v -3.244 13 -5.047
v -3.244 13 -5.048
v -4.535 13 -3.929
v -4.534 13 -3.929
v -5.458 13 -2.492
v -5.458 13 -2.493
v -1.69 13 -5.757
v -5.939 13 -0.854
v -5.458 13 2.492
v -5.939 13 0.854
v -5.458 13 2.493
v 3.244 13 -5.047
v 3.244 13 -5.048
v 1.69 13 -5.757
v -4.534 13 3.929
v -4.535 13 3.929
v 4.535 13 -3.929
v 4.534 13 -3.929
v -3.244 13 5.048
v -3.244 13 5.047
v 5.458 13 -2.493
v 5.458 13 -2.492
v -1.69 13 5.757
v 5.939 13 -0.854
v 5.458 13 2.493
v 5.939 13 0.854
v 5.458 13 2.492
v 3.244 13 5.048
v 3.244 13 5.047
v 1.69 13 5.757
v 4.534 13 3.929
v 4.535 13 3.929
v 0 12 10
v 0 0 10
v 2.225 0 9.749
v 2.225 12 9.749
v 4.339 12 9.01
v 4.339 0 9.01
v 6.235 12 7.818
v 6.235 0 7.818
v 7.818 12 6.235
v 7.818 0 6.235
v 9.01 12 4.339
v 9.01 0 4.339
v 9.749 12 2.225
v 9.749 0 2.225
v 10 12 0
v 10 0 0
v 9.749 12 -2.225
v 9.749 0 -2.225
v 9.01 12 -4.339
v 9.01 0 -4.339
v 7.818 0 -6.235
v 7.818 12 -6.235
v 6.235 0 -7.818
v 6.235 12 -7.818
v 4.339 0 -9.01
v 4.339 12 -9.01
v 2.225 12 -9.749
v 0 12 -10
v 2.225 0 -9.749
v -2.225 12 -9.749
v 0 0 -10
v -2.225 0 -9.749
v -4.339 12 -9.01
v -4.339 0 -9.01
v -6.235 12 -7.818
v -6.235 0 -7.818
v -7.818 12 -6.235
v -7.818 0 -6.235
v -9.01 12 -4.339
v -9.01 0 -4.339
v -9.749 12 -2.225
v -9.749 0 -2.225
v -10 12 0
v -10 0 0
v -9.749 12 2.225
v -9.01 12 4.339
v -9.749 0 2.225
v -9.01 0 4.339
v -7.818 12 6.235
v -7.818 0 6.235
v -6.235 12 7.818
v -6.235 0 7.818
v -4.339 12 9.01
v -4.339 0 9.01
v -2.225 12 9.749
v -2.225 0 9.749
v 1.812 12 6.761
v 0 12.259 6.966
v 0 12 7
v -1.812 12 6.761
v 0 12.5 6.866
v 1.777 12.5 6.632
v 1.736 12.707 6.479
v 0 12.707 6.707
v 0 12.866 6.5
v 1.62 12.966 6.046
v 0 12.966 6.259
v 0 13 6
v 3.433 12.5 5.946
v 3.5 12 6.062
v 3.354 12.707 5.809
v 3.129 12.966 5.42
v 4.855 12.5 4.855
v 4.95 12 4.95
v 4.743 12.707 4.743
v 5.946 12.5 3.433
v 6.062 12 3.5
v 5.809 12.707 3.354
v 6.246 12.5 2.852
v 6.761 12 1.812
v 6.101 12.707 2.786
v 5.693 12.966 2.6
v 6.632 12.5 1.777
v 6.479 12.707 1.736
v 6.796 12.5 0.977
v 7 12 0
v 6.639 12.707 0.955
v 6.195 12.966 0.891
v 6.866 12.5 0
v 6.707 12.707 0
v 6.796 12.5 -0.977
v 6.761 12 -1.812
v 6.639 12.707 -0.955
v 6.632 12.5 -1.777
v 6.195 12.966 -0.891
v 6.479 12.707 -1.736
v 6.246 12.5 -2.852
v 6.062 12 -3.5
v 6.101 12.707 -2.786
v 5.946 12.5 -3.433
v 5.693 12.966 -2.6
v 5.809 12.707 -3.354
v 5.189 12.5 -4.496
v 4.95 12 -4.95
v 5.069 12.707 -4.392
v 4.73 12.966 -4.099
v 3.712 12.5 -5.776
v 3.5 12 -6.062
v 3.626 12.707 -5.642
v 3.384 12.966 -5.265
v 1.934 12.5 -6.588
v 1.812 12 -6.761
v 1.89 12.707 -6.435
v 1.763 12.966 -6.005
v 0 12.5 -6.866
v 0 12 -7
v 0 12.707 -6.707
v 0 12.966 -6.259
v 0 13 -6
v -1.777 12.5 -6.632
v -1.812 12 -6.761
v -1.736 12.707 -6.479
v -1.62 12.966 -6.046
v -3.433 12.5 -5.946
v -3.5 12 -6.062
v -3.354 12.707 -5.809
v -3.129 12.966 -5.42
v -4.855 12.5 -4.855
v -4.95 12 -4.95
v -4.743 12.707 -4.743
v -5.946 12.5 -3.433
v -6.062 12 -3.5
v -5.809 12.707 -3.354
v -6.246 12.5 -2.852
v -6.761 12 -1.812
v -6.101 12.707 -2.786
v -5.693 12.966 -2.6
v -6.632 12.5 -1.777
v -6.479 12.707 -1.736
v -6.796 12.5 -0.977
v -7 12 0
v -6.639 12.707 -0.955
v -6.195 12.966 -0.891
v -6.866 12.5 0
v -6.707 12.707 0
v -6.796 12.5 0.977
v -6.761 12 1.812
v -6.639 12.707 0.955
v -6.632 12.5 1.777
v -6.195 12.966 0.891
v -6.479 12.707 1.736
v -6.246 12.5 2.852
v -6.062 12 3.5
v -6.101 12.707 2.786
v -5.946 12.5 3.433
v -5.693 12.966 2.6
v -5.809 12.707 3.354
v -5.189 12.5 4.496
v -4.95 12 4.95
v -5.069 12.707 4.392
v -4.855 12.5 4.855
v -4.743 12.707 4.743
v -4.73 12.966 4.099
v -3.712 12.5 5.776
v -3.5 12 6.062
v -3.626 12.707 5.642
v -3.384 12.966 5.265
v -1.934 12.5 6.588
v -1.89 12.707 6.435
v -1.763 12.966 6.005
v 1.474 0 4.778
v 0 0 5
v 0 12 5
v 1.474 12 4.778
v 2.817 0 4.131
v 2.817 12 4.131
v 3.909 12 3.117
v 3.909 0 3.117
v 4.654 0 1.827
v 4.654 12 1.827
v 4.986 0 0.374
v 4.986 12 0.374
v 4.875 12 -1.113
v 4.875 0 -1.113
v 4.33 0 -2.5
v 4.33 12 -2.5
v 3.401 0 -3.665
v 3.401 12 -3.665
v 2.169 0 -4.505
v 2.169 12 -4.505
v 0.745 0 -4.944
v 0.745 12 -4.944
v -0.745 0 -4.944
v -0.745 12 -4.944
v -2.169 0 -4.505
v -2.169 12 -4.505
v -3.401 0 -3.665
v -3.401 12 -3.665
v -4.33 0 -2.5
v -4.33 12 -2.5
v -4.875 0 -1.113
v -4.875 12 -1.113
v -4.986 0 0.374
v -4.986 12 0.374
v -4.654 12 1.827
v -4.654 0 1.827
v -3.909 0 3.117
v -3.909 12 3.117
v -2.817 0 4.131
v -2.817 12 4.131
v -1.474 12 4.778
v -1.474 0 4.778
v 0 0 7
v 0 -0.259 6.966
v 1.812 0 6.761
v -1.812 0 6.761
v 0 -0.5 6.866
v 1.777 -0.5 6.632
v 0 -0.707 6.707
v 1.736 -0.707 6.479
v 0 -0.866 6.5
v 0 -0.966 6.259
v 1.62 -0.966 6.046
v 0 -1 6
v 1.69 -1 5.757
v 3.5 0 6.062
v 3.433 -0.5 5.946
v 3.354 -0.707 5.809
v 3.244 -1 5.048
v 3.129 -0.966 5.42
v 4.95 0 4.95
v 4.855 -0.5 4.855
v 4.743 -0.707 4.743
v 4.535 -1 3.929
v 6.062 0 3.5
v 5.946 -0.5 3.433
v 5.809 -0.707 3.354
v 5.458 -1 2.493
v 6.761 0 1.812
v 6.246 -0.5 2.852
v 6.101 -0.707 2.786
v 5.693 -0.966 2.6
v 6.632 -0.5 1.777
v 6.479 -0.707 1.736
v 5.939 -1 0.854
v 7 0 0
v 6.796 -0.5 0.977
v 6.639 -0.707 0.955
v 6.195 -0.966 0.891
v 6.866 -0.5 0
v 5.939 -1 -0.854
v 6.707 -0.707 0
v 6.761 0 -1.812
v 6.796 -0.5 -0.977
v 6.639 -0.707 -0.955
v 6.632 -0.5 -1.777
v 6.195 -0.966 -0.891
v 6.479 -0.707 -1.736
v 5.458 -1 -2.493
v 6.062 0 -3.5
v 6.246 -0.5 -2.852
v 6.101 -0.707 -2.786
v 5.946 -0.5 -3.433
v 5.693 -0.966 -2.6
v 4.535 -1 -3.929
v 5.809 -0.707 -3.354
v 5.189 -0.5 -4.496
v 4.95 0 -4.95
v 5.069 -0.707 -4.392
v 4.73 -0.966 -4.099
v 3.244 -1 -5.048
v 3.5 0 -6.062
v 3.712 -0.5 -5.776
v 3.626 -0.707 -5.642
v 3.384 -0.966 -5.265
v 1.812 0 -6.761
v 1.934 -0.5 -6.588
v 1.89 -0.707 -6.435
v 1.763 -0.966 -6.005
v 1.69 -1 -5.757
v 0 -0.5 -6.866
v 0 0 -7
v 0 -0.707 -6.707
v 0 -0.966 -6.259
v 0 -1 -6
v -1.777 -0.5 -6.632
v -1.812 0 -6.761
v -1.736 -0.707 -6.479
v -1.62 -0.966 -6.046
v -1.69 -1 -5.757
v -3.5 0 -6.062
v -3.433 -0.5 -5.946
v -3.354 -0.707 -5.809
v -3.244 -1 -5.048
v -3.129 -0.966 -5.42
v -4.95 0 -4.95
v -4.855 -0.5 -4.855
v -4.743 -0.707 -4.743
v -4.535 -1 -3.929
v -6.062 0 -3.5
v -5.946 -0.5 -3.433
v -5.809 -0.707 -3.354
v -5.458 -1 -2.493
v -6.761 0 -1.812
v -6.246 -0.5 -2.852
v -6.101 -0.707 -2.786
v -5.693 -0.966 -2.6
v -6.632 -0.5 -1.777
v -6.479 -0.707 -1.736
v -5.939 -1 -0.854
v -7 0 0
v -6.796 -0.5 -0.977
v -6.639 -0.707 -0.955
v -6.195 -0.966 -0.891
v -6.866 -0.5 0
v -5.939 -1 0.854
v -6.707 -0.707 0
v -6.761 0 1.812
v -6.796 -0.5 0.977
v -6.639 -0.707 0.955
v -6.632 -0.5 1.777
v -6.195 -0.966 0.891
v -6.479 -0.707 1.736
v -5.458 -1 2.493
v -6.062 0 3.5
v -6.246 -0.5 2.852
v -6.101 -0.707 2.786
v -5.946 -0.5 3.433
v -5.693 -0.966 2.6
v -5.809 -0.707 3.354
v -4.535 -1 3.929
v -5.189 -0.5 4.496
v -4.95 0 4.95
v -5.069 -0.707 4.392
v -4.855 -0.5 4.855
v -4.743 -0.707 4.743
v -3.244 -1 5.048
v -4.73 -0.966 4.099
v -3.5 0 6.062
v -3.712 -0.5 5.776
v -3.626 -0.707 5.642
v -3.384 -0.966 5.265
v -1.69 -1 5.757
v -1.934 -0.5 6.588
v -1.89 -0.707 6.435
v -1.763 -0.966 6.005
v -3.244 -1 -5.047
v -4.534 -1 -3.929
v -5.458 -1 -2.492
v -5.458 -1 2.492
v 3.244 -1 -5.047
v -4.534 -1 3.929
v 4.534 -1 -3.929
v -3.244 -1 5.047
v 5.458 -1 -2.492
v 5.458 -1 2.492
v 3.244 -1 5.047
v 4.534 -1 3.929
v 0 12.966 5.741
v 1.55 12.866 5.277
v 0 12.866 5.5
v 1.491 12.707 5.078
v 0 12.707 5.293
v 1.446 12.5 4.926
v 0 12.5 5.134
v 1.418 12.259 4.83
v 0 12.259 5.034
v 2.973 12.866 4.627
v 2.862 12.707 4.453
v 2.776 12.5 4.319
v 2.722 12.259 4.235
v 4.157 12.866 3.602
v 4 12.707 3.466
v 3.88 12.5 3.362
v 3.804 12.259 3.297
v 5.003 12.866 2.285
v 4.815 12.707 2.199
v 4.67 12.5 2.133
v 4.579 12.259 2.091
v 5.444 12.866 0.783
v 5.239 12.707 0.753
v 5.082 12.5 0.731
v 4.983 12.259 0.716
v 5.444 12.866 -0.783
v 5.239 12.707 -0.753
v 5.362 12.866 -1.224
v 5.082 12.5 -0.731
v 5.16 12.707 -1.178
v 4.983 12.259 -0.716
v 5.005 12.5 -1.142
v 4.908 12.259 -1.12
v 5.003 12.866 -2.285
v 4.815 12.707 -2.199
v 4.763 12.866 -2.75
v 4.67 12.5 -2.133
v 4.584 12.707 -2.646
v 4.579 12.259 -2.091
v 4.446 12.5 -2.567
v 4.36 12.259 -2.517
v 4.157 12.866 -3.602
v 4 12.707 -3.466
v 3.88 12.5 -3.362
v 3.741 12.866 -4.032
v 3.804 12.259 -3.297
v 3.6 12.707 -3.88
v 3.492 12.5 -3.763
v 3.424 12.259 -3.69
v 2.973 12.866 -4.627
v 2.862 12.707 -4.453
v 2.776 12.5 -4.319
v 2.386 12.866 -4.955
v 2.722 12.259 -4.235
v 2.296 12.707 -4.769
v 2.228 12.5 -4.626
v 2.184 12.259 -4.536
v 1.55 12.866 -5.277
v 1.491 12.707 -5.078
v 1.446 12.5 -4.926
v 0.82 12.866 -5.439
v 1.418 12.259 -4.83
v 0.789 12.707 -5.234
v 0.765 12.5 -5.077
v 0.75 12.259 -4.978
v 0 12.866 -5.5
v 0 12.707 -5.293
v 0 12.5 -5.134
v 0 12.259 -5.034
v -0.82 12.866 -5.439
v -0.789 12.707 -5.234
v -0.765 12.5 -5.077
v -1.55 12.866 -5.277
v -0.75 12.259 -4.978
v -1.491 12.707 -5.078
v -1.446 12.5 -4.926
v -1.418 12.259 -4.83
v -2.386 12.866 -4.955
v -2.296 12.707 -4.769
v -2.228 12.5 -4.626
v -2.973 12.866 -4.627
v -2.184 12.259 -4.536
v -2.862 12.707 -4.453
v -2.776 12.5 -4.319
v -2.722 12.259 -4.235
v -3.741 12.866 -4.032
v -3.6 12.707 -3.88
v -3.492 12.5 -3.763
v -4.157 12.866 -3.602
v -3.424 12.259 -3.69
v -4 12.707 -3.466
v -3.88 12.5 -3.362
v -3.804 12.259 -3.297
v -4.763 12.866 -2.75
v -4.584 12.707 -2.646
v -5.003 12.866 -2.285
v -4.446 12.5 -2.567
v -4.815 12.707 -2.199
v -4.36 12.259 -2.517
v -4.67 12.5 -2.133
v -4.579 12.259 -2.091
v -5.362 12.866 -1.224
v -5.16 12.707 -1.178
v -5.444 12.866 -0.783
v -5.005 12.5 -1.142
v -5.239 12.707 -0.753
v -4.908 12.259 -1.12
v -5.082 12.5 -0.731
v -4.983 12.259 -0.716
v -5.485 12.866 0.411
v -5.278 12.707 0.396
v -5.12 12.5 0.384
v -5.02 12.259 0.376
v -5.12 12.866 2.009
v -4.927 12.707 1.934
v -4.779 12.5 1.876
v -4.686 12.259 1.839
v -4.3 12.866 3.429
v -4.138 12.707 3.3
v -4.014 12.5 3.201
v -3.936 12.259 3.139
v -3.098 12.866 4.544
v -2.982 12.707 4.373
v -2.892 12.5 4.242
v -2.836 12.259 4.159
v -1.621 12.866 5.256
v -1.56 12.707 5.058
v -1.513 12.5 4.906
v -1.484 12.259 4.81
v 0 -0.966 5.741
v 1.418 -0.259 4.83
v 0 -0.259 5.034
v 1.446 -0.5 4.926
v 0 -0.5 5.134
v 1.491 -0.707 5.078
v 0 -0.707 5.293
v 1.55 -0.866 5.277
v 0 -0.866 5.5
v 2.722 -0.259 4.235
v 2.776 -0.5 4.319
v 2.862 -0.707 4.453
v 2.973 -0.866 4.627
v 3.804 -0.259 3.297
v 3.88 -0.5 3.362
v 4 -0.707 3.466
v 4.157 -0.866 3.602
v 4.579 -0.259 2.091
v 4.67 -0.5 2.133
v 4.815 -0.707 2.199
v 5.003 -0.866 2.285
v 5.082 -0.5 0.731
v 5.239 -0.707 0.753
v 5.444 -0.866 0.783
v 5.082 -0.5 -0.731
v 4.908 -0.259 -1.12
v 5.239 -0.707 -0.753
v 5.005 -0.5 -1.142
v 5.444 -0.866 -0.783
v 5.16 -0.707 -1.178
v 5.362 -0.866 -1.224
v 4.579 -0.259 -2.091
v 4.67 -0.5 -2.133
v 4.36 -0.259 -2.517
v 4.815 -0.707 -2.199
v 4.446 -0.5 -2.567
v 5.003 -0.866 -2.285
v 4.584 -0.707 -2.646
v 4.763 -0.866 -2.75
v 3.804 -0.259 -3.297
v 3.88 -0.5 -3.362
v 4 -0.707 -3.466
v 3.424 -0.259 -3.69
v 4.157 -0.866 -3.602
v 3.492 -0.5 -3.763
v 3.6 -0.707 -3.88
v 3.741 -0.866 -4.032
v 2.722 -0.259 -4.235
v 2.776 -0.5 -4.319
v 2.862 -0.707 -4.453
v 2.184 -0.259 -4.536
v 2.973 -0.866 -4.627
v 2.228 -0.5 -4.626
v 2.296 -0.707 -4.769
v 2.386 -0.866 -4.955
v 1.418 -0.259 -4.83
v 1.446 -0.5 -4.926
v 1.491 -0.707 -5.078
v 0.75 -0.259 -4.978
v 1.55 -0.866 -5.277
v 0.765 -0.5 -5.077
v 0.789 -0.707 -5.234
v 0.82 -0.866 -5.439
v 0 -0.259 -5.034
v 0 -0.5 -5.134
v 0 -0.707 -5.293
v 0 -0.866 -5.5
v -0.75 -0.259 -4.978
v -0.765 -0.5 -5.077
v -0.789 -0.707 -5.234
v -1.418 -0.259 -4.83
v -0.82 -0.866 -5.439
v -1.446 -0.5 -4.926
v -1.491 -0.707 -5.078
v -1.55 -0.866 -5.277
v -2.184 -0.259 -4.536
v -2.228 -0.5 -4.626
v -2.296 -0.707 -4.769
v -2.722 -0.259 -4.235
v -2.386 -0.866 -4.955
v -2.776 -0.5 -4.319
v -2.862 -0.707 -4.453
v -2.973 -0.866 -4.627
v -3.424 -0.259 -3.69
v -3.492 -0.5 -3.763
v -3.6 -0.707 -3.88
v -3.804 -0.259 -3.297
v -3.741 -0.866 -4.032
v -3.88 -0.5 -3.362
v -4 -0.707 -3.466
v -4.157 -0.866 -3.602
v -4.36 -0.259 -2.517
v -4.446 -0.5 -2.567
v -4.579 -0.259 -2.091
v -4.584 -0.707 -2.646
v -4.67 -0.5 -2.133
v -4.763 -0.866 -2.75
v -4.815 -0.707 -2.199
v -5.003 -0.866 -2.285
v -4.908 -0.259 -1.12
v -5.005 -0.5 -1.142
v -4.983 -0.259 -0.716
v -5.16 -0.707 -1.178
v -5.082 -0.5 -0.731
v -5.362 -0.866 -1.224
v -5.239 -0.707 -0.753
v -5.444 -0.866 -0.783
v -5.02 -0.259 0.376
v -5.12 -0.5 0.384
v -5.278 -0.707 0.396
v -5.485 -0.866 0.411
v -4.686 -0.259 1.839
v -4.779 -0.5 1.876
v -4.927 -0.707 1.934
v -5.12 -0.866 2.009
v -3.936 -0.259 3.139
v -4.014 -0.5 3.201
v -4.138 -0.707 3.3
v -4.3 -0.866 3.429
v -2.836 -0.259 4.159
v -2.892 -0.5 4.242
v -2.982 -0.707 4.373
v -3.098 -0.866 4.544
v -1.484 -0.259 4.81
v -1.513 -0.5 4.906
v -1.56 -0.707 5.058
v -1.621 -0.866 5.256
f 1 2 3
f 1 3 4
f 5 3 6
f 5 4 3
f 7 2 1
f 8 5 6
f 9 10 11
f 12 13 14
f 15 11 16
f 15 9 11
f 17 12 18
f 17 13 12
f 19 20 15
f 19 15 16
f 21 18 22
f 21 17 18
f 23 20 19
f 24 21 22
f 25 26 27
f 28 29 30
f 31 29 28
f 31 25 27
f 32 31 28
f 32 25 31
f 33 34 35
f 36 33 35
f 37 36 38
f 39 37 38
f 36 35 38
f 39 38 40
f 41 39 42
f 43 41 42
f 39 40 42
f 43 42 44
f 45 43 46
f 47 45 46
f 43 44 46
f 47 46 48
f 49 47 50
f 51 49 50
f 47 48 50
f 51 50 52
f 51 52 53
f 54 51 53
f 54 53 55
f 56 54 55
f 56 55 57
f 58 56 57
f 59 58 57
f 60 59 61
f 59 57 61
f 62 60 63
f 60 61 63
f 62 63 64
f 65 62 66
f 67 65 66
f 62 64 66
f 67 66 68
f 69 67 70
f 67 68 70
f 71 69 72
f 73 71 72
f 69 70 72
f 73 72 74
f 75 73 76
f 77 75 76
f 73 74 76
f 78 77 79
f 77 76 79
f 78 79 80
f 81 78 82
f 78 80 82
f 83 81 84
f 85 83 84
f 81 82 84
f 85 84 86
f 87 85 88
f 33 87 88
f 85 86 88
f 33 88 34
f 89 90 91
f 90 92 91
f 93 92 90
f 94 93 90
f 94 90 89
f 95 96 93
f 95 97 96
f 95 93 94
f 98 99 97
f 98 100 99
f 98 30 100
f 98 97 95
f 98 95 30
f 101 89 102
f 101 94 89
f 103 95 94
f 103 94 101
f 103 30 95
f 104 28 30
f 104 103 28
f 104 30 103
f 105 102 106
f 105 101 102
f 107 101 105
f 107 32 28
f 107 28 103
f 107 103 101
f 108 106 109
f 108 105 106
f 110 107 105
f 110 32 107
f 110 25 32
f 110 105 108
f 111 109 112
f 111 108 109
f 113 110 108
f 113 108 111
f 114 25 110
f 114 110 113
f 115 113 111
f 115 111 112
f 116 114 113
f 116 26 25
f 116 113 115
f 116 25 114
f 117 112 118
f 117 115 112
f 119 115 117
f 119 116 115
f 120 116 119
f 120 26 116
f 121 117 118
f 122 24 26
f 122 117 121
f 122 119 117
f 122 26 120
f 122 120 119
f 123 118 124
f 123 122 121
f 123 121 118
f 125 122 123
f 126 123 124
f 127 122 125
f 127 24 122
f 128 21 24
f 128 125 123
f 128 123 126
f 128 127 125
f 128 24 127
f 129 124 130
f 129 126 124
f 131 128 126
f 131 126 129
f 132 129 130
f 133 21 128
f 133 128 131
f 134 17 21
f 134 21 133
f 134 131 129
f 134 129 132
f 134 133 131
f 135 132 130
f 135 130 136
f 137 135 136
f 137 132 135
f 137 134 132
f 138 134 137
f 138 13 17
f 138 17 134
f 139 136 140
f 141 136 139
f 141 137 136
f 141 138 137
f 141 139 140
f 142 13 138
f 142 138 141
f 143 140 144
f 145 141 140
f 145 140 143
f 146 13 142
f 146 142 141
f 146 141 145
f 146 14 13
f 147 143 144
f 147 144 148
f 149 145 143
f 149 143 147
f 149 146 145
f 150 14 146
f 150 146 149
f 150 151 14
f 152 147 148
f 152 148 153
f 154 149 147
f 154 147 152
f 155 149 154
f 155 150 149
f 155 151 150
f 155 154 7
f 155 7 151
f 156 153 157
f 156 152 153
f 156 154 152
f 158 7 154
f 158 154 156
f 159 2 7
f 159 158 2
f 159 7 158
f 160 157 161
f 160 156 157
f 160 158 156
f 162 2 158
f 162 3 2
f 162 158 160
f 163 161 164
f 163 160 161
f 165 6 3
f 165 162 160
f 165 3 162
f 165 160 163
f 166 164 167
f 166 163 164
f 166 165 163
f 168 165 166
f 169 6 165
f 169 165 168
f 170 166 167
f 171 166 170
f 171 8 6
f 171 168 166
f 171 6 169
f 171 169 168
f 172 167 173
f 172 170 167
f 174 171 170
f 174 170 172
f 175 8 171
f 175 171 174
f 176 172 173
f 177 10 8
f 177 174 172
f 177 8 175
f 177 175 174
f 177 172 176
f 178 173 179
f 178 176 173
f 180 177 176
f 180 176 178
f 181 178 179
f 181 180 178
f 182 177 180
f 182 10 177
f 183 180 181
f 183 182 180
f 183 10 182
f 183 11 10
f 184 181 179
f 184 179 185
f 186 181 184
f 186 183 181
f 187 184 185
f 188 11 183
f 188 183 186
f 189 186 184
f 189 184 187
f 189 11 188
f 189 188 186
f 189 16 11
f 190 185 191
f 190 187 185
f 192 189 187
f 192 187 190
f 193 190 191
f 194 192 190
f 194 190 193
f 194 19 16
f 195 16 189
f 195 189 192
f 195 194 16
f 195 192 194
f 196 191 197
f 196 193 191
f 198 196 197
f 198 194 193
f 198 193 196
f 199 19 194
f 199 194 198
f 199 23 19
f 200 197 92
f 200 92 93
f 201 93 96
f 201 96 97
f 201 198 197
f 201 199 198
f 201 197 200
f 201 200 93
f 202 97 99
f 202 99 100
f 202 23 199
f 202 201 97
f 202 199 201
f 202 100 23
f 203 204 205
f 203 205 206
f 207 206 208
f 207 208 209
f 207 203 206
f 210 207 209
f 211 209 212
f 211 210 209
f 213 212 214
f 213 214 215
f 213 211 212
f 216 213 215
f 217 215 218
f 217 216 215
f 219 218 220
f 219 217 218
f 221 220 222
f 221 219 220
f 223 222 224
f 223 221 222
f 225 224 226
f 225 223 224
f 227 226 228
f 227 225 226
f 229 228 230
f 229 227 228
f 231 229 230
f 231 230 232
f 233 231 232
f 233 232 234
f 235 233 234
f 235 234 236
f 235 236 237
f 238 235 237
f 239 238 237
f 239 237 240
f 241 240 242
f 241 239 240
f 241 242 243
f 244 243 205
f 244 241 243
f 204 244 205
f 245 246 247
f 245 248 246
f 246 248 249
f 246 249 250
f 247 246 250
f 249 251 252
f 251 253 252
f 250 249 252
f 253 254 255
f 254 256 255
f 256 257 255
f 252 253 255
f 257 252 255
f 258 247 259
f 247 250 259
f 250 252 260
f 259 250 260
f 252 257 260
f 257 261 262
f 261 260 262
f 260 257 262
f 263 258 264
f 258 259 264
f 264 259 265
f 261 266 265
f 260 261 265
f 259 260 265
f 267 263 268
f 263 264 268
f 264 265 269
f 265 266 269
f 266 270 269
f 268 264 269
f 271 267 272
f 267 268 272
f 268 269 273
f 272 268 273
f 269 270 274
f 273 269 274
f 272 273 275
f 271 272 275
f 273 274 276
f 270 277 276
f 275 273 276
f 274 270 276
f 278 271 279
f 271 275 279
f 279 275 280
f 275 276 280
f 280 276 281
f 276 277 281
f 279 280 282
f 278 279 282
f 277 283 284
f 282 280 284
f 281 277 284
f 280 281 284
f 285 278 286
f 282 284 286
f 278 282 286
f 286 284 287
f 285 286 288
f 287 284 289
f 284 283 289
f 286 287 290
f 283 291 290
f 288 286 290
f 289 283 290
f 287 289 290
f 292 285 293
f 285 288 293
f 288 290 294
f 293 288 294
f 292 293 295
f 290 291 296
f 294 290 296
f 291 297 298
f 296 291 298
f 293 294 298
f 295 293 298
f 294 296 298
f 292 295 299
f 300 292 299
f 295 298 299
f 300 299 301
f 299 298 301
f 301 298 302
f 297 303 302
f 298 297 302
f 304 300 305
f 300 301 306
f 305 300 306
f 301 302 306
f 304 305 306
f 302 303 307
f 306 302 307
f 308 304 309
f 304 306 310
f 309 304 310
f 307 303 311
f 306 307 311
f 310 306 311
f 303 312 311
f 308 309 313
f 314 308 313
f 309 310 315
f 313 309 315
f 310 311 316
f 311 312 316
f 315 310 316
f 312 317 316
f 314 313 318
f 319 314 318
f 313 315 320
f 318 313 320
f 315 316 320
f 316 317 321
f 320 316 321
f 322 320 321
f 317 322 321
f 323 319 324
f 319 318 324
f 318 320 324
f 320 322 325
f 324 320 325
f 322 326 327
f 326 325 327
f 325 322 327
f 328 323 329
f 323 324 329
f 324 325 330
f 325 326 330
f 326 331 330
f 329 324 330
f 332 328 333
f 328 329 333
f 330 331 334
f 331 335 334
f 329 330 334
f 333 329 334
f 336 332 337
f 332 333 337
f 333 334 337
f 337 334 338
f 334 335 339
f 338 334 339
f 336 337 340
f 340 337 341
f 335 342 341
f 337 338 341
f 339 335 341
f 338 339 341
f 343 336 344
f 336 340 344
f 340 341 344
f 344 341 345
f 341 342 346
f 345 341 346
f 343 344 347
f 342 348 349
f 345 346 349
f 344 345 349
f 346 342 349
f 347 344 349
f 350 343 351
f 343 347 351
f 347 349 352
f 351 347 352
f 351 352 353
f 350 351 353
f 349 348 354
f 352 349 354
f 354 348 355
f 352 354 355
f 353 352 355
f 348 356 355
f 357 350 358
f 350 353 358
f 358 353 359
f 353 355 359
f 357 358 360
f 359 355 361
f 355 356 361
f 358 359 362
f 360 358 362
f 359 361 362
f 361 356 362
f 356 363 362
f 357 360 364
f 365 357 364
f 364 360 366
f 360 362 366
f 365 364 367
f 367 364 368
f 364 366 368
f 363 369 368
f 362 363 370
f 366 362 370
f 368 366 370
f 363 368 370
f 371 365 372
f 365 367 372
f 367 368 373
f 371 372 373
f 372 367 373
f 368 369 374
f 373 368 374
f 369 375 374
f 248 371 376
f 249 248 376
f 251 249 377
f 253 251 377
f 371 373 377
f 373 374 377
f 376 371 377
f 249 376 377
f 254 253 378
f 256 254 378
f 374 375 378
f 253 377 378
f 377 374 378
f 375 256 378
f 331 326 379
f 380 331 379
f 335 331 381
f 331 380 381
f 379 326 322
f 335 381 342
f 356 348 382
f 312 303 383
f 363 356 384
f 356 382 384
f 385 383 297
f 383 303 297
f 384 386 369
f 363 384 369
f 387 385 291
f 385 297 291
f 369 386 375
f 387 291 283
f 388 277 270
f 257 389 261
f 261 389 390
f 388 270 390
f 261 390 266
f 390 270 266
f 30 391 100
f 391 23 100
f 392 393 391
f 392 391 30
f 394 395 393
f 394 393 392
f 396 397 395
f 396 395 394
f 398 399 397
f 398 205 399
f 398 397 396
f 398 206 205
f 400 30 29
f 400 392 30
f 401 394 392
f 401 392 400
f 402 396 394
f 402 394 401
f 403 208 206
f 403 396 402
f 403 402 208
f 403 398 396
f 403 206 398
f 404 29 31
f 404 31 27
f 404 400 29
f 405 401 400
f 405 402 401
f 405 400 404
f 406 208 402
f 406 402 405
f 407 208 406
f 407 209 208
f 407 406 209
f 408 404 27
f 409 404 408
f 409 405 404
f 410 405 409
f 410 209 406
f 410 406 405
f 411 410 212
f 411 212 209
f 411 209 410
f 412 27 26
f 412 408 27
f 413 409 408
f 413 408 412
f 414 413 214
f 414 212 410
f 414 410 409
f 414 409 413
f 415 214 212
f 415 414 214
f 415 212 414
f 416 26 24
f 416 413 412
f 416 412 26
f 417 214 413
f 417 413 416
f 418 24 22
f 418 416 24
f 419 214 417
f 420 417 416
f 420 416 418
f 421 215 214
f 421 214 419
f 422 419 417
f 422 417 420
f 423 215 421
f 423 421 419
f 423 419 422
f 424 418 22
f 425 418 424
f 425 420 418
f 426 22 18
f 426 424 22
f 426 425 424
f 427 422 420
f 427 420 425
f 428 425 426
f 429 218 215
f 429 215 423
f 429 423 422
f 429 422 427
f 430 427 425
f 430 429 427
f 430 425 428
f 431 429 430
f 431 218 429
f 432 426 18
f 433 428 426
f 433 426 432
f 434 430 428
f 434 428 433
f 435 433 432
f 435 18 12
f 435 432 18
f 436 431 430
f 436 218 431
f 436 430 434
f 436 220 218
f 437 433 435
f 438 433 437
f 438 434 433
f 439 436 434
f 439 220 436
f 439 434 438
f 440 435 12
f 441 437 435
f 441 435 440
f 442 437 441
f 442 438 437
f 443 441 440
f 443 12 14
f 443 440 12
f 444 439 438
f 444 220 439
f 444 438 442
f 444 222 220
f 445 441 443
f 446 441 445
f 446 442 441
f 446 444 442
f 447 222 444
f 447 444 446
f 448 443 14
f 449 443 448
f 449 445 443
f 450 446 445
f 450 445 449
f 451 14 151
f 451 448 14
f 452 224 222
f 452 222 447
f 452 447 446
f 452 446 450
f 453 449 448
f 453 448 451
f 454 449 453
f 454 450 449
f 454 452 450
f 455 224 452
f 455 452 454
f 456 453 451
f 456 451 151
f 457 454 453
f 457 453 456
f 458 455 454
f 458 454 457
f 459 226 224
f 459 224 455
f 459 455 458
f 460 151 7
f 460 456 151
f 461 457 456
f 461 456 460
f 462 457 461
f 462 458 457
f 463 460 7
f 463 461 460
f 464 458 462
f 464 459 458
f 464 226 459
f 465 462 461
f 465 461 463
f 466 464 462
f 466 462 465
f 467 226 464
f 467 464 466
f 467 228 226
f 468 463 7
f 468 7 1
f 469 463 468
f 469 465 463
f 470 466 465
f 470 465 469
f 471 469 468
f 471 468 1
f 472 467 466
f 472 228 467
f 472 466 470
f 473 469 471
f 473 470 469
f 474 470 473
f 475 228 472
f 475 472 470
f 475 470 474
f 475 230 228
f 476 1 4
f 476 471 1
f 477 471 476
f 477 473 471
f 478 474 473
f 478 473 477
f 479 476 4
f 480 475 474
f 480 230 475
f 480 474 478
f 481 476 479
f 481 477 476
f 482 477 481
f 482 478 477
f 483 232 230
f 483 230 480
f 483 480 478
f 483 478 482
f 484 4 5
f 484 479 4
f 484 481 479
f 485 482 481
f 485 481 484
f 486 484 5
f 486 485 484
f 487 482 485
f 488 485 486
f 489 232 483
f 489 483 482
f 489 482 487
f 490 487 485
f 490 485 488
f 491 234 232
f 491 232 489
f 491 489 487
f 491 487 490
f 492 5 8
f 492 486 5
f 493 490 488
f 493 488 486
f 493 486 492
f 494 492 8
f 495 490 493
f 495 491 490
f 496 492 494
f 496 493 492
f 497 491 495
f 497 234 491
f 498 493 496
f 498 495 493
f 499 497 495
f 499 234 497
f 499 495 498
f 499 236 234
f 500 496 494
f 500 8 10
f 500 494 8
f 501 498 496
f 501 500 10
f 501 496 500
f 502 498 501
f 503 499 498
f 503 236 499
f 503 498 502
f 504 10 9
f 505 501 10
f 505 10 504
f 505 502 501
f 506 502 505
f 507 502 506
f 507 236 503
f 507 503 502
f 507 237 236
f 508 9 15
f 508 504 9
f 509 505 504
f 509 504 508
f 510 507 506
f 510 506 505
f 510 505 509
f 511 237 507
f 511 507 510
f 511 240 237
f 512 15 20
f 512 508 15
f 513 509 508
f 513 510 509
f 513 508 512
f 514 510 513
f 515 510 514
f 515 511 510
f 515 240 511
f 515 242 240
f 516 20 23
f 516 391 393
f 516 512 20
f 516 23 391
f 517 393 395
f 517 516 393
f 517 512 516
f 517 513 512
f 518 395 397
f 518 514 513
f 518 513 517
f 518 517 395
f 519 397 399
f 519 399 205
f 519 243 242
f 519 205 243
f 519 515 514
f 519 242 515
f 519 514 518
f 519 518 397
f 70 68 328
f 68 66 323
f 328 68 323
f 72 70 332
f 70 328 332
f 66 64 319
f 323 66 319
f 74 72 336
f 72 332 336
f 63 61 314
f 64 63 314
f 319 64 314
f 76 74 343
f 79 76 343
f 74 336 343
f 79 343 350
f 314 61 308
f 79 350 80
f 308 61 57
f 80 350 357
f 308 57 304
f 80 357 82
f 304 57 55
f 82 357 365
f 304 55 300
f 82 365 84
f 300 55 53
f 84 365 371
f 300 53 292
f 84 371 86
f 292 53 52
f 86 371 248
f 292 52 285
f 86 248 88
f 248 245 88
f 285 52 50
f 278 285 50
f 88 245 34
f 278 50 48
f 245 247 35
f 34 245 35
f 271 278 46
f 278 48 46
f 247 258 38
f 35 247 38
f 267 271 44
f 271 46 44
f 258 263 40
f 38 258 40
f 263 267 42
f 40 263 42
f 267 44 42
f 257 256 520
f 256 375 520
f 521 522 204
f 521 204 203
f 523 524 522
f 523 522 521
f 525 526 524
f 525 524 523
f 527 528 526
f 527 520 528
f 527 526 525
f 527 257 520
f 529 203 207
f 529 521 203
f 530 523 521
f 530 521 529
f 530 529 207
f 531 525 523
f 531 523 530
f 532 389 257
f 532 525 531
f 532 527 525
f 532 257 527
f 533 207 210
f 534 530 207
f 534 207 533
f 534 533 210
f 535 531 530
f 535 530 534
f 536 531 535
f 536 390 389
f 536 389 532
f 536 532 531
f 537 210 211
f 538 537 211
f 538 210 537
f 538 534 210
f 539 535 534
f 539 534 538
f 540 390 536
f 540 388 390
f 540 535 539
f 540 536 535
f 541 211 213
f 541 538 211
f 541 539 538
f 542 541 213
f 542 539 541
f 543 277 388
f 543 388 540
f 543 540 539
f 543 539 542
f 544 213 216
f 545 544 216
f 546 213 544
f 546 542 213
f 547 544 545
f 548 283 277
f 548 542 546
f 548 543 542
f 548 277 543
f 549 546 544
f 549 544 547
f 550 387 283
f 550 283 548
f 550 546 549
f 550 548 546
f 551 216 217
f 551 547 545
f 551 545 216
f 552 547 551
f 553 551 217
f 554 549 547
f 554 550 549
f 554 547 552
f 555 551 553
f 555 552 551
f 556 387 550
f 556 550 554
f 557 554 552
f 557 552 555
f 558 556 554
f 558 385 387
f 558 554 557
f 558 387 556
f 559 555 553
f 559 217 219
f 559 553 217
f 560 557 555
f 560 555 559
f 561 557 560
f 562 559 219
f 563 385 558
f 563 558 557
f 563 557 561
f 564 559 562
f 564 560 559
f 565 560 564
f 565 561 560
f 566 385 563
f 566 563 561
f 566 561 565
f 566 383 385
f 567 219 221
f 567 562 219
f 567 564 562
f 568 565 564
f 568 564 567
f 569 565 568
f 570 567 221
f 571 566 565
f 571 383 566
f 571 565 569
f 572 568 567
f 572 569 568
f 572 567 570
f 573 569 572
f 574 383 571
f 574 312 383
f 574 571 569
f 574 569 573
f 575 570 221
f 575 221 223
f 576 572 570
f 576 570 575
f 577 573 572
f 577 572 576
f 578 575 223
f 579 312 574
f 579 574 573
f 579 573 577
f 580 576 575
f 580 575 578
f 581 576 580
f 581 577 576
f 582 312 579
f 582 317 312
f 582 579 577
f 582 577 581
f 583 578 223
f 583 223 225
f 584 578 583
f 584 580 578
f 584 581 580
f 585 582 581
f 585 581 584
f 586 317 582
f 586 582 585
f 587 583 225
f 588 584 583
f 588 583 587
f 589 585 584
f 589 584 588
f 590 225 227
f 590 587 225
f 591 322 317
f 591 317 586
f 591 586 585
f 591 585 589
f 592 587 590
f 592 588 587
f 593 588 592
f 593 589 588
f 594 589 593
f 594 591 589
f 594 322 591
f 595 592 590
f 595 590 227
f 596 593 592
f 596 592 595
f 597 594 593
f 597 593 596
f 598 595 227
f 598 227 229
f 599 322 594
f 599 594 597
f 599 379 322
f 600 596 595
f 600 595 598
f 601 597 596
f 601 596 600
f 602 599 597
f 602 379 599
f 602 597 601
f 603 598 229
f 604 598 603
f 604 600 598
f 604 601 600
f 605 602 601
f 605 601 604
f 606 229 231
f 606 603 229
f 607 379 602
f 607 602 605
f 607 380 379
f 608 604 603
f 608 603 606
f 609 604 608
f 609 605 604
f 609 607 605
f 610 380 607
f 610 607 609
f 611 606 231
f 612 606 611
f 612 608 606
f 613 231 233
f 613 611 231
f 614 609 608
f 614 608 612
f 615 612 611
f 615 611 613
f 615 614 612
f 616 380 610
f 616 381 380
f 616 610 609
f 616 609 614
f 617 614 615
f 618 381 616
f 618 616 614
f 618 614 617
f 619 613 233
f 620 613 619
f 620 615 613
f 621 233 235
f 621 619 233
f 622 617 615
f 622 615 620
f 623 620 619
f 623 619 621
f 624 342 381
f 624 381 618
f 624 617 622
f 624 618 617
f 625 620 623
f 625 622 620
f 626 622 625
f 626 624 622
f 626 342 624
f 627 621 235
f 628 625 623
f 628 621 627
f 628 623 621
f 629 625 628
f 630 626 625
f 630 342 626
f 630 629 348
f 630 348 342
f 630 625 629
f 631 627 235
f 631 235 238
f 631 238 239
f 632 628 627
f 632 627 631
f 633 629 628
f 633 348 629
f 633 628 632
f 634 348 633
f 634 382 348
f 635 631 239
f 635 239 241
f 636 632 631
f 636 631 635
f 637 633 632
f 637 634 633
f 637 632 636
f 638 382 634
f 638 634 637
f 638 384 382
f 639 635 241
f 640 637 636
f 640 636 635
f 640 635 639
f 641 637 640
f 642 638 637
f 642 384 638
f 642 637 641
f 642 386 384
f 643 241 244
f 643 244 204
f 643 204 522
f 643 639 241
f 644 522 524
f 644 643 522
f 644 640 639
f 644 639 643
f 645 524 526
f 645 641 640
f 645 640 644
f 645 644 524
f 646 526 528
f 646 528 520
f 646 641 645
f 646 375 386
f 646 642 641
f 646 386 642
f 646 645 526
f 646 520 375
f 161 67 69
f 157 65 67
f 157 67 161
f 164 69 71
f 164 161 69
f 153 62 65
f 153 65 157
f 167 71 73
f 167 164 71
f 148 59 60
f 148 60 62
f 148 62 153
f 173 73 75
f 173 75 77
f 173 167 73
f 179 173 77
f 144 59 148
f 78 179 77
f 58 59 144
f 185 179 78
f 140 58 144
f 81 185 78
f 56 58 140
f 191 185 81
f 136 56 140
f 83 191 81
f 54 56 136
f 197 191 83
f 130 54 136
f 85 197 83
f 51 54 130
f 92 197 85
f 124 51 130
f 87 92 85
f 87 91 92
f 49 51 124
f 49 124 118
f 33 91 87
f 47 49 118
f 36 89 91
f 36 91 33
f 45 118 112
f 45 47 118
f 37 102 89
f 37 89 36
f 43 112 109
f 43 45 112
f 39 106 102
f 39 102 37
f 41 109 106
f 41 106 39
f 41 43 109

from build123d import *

# Parameters (mm, degrees)
PROFILE_SKETCH_R              = 10
PROFILE_SKETCH_R_2            = 5
CYLINDER_EXTRUDE_DEPTH        = 12
LIP_RING_SKETCH_R             = 7
LIP_RING_SKETCH_R_2           = 5
BOTTOM_LIP_RING_EXTRUDE_DEPTH = 1
BOTTOM_RING_FILLET_R          = 1
TOP_START                     = -13
SKETCH2_2_R                   = 7
SKETCH2_2_R_2                 = 5
TOP_LIP_RING_EXTRUDE_DEPTH    = 1
TOP_RING_FILLET_R             = 1


with BuildPart() as part:
    # Profile Sketch → Cylinder Extrude (new body)
    with BuildSketch(Plane(origin=(0, 0, 0), x_dir=(1, 0, 0), z_dir=(0, 1, 0))):
        with Locations(Location((0, 0, 0), (0, 0, 270))):
            Circle(PROFILE_SKETCH_R)
        with Locations(Location((0, 0, 0), (0, 0, 270))):
            Circle(PROFILE_SKETCH_R_2, mode=Mode.SUBTRACT)
    extrude(amount=CYLINDER_EXTRUDE_DEPTH)

    # Lip Ring Sketch → Bottom Lip Ring Extrude (add)
    with BuildSketch(Plane(origin=(0, 12, 0), x_dir=(1, 0, 0), z_dir=(0, 1, 0))):
        with Locations(Location((0, 0, 0), (0, 0, 270))):
            Circle(LIP_RING_SKETCH_R)
        with Locations(Location((0, 0, 0), (0, 0, 270))):
            Circle(LIP_RING_SKETCH_R_2, mode=Mode.SUBTRACT)
    extrude(amount=BOTTOM_LIP_RING_EXTRUDE_DEPTH)

    # Bottom Ring Fillet
    bottom_ring_fillet_edges = [part.edges().sort_by_distance(p)[0] for p in [
        (0, 13, -7),
        (0, 13, -5),
    ]]
    fillet(bottom_ring_fillet_edges, radius=BOTTOM_RING_FILLET_R - 0.0001)  # a hair under: the kernel refuses the full size

    # Sketch2<2> → Top Lip Ring Extrude (add)
    with BuildSketch(Plane(origin=(0, 12, 0), x_dir=(1, 0, 0), z_dir=(0, 1, 0)).offset(TOP_START)):
        with Locations(Location((0, 0, 0), (0, 0, 270))):
            Circle(SKETCH2_2_R)
        with Locations(Location((0, 0, 0), (0, 0, 270))):
            Circle(SKETCH2_2_R_2, mode=Mode.SUBTRACT)
    extrude(amount=TOP_LIP_RING_EXTRUDE_DEPTH)

    # Top Ring Fillet
    top_ring_fillet_edges = [part.edges().sort_by_distance(p)[0] for p in [
        (0, -1, -7),
        (0, -1, -5),
    ]]
    fillet(top_ring_fillet_edges, radius=TOP_RING_FILLET_R - 0.0001)  # a hair under: the kernel refuses the full size


solid = part.part
